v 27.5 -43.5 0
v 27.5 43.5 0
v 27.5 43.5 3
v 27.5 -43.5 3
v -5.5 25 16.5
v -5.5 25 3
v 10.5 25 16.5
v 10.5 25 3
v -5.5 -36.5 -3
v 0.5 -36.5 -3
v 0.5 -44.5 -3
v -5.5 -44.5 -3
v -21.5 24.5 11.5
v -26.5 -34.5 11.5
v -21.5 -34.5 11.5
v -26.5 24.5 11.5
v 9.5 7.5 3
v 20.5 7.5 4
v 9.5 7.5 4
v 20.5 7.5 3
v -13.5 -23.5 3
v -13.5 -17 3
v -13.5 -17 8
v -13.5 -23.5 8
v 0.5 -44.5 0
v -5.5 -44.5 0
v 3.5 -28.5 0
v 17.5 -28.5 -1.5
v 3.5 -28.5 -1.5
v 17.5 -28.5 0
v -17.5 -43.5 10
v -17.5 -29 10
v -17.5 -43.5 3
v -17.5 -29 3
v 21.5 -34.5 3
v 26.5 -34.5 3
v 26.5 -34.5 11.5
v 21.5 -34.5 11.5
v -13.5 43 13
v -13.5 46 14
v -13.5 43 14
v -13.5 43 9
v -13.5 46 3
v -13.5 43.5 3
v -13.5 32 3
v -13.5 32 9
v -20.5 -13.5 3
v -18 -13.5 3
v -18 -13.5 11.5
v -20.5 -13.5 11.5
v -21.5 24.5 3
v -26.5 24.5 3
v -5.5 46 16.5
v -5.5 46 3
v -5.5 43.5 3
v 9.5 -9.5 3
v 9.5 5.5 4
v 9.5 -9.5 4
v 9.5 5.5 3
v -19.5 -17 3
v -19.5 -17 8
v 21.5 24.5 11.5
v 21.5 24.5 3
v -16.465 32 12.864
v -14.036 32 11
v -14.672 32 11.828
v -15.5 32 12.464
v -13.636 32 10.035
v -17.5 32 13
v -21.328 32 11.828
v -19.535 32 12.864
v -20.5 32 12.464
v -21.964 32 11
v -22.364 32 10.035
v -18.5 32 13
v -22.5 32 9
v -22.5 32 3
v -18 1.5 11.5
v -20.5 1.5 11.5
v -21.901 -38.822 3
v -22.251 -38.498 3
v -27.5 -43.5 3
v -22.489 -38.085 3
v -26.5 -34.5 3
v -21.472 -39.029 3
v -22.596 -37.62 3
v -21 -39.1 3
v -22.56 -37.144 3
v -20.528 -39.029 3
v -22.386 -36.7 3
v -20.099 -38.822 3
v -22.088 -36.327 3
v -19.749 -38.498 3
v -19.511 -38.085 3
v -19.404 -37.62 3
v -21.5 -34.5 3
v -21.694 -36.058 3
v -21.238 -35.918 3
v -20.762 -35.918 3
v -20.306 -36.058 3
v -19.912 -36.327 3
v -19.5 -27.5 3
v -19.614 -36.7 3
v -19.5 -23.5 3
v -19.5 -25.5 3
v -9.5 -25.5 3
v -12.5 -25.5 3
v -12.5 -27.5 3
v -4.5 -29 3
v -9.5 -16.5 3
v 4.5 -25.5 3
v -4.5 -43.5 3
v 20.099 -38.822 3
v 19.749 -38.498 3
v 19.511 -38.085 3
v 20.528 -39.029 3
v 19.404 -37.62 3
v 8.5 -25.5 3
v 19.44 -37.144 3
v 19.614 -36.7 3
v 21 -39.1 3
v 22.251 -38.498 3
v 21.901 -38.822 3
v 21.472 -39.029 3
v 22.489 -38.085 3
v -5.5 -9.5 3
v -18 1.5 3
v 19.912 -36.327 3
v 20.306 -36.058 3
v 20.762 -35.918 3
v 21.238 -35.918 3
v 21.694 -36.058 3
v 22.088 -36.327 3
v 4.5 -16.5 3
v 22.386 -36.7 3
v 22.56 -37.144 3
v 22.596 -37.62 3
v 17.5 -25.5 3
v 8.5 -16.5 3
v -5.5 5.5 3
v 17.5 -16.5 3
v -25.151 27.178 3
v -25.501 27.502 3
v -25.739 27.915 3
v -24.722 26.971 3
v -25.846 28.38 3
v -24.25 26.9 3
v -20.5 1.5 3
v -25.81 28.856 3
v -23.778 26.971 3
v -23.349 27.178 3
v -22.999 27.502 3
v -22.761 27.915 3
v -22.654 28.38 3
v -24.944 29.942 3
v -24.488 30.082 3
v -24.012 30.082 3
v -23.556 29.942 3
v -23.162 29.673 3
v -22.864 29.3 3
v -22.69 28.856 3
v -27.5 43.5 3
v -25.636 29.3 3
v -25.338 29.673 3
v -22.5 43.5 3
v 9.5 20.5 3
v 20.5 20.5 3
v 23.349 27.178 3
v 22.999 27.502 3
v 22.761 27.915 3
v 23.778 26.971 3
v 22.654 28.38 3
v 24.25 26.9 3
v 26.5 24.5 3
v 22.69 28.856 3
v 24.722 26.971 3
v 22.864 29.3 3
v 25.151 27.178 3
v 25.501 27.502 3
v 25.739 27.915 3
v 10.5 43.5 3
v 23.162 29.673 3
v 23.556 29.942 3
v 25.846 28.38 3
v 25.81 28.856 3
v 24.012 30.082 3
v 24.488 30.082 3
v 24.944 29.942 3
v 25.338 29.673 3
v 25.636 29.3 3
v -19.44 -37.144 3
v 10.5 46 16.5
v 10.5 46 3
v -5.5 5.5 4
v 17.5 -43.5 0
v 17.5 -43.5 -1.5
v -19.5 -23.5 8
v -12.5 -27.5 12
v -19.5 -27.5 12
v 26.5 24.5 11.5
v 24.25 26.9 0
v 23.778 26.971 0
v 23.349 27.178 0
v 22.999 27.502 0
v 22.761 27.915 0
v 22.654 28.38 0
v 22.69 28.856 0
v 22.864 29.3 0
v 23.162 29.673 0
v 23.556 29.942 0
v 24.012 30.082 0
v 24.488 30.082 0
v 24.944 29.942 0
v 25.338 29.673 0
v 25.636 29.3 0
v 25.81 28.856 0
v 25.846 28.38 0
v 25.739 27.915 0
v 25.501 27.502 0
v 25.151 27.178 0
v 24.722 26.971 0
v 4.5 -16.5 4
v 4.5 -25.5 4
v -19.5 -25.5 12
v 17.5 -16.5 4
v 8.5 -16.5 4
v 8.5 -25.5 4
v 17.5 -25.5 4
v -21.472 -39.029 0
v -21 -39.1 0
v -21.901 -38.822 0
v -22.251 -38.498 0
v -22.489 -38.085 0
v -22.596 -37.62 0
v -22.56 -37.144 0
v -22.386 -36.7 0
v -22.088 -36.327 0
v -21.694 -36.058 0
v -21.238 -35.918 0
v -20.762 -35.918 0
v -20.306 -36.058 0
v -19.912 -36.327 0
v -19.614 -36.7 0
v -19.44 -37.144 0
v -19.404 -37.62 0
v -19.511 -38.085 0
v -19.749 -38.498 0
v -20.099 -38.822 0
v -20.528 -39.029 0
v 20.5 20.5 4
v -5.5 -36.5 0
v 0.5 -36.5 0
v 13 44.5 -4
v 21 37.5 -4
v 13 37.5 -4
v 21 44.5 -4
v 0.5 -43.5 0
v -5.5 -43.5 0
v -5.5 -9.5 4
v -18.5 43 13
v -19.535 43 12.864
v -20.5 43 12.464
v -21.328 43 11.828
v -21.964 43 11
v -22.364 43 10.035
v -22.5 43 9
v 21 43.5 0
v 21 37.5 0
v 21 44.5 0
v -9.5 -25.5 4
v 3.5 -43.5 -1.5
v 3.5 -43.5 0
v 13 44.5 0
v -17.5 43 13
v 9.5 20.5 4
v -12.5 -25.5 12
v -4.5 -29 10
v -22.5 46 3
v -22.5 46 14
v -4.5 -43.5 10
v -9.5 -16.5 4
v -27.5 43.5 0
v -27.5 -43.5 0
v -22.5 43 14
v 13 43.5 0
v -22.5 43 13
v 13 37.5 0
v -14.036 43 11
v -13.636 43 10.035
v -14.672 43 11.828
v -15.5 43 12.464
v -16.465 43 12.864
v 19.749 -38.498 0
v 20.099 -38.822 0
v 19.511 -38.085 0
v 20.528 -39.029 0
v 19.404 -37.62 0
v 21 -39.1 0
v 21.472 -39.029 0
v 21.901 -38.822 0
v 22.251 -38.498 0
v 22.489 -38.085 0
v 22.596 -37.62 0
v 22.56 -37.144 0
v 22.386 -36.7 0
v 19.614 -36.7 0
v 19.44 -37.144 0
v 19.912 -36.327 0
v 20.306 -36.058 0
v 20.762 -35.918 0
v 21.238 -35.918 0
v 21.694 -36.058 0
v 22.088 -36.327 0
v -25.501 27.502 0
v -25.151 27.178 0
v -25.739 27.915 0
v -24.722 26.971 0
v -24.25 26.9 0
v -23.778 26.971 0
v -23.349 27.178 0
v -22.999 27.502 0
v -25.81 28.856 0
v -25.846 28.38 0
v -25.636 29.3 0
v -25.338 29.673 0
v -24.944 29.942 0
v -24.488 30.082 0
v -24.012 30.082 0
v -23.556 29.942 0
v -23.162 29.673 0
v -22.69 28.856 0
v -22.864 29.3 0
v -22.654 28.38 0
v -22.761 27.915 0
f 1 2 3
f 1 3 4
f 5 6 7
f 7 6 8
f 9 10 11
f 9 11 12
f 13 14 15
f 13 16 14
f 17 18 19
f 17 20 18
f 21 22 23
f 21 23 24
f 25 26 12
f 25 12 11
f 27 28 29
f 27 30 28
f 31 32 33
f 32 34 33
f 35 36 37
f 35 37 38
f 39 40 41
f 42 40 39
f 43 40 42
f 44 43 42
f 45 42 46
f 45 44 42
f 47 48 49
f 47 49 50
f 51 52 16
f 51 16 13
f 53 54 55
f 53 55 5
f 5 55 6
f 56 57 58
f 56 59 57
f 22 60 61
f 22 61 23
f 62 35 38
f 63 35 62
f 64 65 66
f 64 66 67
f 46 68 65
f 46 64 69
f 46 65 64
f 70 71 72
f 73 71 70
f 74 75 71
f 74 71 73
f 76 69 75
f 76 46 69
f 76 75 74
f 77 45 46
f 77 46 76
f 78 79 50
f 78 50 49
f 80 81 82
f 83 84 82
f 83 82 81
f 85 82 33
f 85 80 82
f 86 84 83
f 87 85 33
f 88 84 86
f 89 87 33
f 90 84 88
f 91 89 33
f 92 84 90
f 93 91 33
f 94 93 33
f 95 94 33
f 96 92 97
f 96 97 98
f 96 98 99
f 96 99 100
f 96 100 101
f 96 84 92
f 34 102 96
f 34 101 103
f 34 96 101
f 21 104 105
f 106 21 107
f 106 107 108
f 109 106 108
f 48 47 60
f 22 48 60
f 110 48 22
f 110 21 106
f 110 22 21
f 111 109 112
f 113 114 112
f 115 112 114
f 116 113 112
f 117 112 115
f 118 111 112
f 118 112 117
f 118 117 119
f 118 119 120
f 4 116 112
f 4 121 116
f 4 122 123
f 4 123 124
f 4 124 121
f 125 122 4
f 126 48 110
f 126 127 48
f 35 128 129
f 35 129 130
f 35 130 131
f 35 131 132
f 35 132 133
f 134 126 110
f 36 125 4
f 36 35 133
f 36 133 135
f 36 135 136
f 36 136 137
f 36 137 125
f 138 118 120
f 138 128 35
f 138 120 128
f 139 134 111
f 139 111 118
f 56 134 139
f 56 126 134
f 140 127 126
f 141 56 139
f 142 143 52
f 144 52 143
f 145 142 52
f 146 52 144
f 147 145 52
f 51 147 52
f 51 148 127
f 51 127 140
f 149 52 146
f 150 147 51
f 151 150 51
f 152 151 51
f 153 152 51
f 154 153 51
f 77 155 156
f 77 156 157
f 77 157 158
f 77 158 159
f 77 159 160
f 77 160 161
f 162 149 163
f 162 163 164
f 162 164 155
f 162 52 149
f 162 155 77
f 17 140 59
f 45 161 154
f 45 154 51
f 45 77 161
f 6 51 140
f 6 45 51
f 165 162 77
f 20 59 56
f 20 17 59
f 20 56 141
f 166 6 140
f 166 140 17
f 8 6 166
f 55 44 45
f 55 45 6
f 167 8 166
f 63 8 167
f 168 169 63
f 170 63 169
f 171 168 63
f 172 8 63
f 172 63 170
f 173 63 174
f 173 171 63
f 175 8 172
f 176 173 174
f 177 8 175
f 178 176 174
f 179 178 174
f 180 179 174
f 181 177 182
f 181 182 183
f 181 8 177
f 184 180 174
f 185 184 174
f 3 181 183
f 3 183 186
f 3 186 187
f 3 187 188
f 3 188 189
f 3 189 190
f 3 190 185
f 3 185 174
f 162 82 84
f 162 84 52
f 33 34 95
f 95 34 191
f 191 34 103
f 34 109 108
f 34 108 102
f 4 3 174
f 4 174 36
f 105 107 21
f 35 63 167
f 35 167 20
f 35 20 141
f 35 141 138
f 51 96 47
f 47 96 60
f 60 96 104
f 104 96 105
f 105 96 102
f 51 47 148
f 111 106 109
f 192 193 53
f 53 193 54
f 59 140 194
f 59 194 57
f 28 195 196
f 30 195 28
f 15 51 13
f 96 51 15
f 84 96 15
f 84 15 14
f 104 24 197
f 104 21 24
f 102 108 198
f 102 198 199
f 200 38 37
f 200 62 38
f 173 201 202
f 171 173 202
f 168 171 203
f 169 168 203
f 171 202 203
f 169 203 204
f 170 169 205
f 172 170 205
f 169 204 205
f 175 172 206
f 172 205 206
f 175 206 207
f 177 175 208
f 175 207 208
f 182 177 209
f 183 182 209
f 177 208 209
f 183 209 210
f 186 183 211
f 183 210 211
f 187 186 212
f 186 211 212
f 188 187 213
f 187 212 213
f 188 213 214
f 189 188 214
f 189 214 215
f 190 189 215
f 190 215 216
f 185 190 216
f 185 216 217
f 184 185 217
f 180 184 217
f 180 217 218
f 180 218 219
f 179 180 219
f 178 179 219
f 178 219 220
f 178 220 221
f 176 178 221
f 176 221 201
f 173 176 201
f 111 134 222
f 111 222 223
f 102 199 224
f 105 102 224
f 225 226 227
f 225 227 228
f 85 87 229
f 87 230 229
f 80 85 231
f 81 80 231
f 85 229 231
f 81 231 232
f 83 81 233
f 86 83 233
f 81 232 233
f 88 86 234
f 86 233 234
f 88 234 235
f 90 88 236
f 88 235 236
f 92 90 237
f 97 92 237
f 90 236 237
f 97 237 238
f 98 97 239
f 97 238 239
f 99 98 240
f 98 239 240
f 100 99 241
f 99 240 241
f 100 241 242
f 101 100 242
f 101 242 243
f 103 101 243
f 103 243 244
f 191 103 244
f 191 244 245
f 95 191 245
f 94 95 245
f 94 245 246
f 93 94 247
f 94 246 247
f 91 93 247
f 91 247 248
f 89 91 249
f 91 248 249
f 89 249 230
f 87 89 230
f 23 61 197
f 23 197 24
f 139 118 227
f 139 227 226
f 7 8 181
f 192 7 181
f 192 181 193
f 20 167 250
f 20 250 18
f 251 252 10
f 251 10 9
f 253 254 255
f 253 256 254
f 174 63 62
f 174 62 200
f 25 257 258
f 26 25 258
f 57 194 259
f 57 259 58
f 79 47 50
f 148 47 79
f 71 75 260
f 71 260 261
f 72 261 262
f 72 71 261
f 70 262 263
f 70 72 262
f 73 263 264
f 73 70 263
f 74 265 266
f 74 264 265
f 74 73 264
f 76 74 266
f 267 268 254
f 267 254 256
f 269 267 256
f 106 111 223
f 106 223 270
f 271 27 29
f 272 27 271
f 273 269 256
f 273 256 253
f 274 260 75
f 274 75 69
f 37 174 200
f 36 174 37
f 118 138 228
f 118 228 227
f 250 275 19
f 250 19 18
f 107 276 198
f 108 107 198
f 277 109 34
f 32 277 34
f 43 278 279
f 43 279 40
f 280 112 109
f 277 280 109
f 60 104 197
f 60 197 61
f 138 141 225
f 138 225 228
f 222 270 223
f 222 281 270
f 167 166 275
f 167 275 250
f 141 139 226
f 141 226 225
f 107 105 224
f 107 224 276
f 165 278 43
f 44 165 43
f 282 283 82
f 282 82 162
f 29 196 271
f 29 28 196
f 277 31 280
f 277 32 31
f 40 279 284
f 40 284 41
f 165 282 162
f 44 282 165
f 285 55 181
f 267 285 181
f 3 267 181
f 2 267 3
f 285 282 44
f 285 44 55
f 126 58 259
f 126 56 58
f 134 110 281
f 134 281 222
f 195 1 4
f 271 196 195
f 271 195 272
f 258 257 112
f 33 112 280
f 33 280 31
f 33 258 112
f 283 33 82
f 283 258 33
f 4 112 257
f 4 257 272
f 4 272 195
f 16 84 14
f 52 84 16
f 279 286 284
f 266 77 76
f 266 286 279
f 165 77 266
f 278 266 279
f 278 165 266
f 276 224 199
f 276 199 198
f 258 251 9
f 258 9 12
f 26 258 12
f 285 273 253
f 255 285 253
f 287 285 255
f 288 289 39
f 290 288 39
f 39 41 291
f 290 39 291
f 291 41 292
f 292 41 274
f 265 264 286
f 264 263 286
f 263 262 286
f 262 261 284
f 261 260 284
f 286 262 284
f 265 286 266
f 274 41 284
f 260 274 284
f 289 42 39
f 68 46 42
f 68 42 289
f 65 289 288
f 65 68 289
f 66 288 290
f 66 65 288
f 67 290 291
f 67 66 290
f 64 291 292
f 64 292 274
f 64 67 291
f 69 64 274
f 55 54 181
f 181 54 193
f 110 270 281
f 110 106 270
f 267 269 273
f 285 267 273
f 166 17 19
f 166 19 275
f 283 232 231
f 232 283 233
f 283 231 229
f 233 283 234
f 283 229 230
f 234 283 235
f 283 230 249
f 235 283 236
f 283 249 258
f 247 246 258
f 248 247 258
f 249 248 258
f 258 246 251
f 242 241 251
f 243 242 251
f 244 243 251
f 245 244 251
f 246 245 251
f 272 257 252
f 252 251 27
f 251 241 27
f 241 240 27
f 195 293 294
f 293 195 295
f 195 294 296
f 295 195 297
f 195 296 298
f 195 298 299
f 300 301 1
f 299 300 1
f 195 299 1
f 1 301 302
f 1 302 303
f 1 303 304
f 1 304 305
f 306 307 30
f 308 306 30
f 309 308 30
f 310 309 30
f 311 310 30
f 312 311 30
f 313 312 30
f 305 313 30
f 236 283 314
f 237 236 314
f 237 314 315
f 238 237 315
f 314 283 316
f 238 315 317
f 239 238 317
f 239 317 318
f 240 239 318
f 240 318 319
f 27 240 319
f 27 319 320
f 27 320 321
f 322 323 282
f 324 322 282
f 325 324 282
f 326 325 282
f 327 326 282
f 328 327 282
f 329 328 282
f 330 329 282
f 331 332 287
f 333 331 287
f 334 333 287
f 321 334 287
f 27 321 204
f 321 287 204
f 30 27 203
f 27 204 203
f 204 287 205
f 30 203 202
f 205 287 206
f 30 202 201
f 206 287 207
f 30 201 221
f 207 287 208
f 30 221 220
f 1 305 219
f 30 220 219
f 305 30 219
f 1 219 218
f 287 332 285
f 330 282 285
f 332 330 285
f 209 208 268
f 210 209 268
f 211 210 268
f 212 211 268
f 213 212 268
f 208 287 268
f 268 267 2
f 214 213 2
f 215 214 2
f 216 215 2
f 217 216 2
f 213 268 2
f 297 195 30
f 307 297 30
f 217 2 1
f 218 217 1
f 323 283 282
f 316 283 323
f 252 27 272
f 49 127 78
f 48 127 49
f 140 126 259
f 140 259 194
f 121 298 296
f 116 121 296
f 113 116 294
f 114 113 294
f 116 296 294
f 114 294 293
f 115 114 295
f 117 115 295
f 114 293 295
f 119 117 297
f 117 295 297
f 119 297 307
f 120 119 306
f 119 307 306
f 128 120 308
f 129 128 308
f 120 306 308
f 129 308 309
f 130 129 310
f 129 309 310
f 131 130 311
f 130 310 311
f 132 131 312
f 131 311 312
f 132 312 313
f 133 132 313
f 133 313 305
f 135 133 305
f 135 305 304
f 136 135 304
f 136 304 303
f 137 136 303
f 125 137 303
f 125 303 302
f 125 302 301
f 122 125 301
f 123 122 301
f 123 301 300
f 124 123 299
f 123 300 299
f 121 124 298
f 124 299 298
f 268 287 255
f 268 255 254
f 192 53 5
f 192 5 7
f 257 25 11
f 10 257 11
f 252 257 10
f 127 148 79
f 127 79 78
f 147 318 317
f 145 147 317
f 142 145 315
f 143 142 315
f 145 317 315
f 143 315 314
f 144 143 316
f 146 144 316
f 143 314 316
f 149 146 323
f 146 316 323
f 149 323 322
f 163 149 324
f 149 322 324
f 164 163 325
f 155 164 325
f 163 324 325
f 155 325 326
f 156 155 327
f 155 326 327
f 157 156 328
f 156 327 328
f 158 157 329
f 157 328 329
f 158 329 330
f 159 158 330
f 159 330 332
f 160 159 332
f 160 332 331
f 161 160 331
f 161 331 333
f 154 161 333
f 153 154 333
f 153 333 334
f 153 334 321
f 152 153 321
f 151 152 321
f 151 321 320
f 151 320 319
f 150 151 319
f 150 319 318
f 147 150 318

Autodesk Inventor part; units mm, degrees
ref_plane "YZ Plane" through (0, 0, 0) normal (1, 0, 0) x (0, 1, 0)
ref_plane "XZ Plane" through (0, 0, 0) normal (0, 1, 0) x (-1, 0, 0)
ref_plane "XY Plane" through (0, 0, 0) normal (0, 0, 1) x (1, 0, 0)
sketch "スケッチ1" plane through (0, 0, 0) normal (0, 0, 1) x (1, 0, 0)
  line L0 (-27.5, 43.5) -> (27.5, 43.5)
  line L1 (27.5, 43.5) -> (27.5, -43.5)
  line L2 (27.5, -43.5) -> (-27.5, -43.5)
  line L3 (-27.5, -43.5) -> (-27.5, 43.5)
  point P0 (0, 0)
  dimension "d0" = 87
  dimension "d1" = 55
  dimension "d2" = 27.5
  dimension "d3" = 43.5
extrude "押し出し1" add sketch "スケッチ1" along normal blind 3
sketch "スケッチ2" plane through (0, 0, 3) normal (0, 0, 1) x (1, 0, 0)
  circle A0 centre (-24.25, 28.5) radius 1.6
  circle A1 centre (24.25, 28.5) radius 1.6
  circle A2 centre (-21, -37.5) radius 1.6
  circle A3 centre (21, -37.5) radius 1.6
  line L0 (-27.5, 43.5) -> (27.5, 43.5) projected
  point P0 (0, 0)
  dimension "d6" = 3.2
  dimension "d7" = 48.5
  dimension "d8" = 42
  dimension "d9" = 21
  dimension "d10" = 24.25
  dimension "d11" = 66
  dimension "d12" = 66
  dimension "d22" = 15
  dimension "d23" = 15
hole "穴1" at (-21, -37.5, 3) at (21, -37.5, 3) at (24.25, 28.5, 3) at (-24.25, 28.5, 3) direction (0, 0, -1) diameter 3.2 end through all
sketch "スケッチ3" plane through (0, 0, 3) normal (0, 0, 1) x (1, 0, 0)
  line L0 (27.5, -43.5) -> (-27.5, -43.5) projected
  line L1 (-26.5, 24.5) -> (-21.5, 24.5)
  line L2 (-21.5, 24.5) -> (-21.5, -34.5)
  line L3 (-21.5, -34.5) -> (-26.5, -34.5)
  line L4 (-26.5, -34.5) -> (-26.5, 24.5)
  line L5 (21.5, 24.5) -> (26.5, 24.5)
  line L6 (26.5, 24.5) -> (26.5, -34.5)
  line L7 (26.5, -34.5) -> (21.5, -34.5)
  line L8 (21.5, -34.5) -> (21.5, 24.5)
  point P0 (0, 0)
  dimension "d24" = 5
  dimension "d25" = 59
  dimension "d26" = 9
  dimension "d27" = 9
  dimension "d28" = 43
  dimension "d29" = 21.5
extrude "押し出し2" add sketch "スケッチ3" along normal blind 8.5
sketch "スケッチ4" plane through (0, 0, 3) normal (0, 0, 1) x (1, 0, 0)
  line L0 (-5.5, 25) -> (10.5, 25)
  line L1 (10.5, 25) -> (10.5, 46)
  line L2 (10.5, 46) -> (-5.5, 46)
  line L3 (-5.5, 46) -> (-5.5, 25)
  line L4 (27.5, 43.5) -> (27.5, -43.5) projected
  point P0 (0, 0)
  dimension "d57" = 16
  dimension "d58" = 21
  dimension "d59" = 2.5
  dimension "d60" = 17
extrude "押し出し3" add sketch "スケッチ4" along normal blind 13.5
sketch "スケッチ5" plane through (0, 0, 3) normal (0, 0, 1) x (1, 0, 0)
  line L0 (-22.5, 46) -> (-13.5, 46)
  line L1 (-13.5, 46) -> (-13.5, 32)
  line L2 (-13.5, 32) -> (-22.5, 32)
  line L3 (-22.5, 32) -> (-22.5, 46)
  line L4 (-27.5, -43.5) -> (-27.5, 43.5) projected
  point P0 (5.6589, 43.5)
  dimension "d61" = 5
  dimension "d62" = 9
  dimension "d63" = 14
  dimension "d64" = 2.5
extrude "押し出し4" add sketch "スケッチ5" along normal blind 11
sketch "スケッチ6" plane through (0, 0, 3) normal (0, 0, 1) x (1, 0, 0)
  line L0 (27.5, -43.5) -> (-27.5, -43.5) projected
  line L1 (-17.5, -43.5) -> (-4.5, -43.5)
  line L2 (-4.5, -43.5) -> (-4.5, -29)
  line L3 (-4.5, -29) -> (-17.5, -29)
  line L4 (-17.5, -29) -> (-17.5, -43.5)
  line L5 (-27.5, -43.5) -> (-27.5, 43.5) projected
  point P0 (0, 0)
  dimension "d65" = 13
  dimension "d66" = 10
  dimension "d67" = 14.5
extrude "押し出し5" add sketch "スケッチ6" along normal blind 7
sketch "スケッチ7" plane through (0, 0, 0) normal (0, 0, -1) x (-1, 0, 0)
  line L0 (5.5, -44.5) -> (-0.5, -44.5)
  line L1 (-0.5, -44.5) -> (-0.5, -36.5)
  line L2 (-0.5, -36.5) -> (5.5, -36.5)
  line L3 (5.5, -36.5) -> (5.5, -44.5)
  line L4 (27.5, -43.5) -> (27.5, 43.5) projected
  point P0 (0, 0)
  dimension "d68" = 6
  dimension "d69" = 8
  dimension "d70" = 22
  dimension "d71" = 1
extrude "押し出し6" add sketch "スケッチ7" along normal blind 3
sketch "スケッチ8" plane through (0, 0, 0) normal (0, 0, -1) x (-1, 0, 0)
  line L0 (-27.5, -43.5) -> (-0.5, -43.5) projected
  line L1 (-3.5, -43.5) -> (-17.5, -43.5)
  line L2 (-17.5, -43.5) -> (-17.5, -28.5)
  line L3 (-17.5, -28.5) -> (-3.5, -28.5)
  line L4 (-3.5, -28.5) -> (-3.5, -43.5)
  line L5 (-27.5, 43.5) -> (-27.5, -43.5) projected
  point P0 (0, 0)
  dimension "d72" = 14
  dimension "d73" = 15
  dimension "d74" = 10
extrude "押し出し7" add sketch "スケッチ8" along normal blind 1.5
sketch "スケッチ9" plane through (0, 0, 0) normal (0, 0, -1) x (-1, 0, 0)
  line L0 (-21, 44.5) -> (-13, 44.5)
  line L1 (-13, 44.5) -> (-13, 37.5)
  line L2 (-13, 37.5) -> (-21, 37.5)
  line L3 (-21, 37.5) -> (-21, 44.5)
  line L4 (-27.5, 43.5) -> (-27.5, -43.5) projected
  point P0 (0, 0)
  dimension "d75" = 8
  dimension "d76" = 7
  dimension "d77" = 6.5
  dimension "d78" = 1
extrude "押し出し8" add sketch "スケッチ9" along normal blind 4
sketch "スケッチ11" plane through (0, 0, 3) normal (0, 0, 1) x (1, 0, 0)
  line L0 (-20.5, 1.5) -> (-18, 1.5)
  line L1 (-18, 1.5) -> (-18, -13.5)
  line L2 (-18, -13.5) -> (-20.5, -13.5)
  line L3 (-20.5, -13.5) -> (-20.5, 1.5)
  line L4 (-17.5, -43.5) -> (-27.5, -43.5) projected
  line L5 (-21.5, 24.5) -> (-21.5, -34.5) projected
  point P0 (0, 0)
  dimension "d79" = 15
  dimension "d80" = 2.5
  dimension "d81" = 30
  dimension "d82" = 1
extrude "押し出し10" add sketch "スケッチ11" along normal blind 8.5
sketch "スケッチ12" plane through (0, 0, 3) normal (0, 0, 1) x (1, 0, 0)
  line L0 (-19.5, -17) -> (-13.5, -17)
  line L1 (-13.5, -17) -> (-13.5, -23.5)
  line L2 (-13.5, -23.5) -> (-19.5, -23.5)
  line L3 (-19.5, -23.5) -> (-19.5, -17)
  line L4 (-17.5, -43.5) -> (-27.5, -43.5) projected
  line L5 (-21.5, 24.5) -> (-21.5, -34.5) projected
  point P0 (0, 0)
  dimension "d83" = 6
  dimension "d84" = 6.5
  dimension "d86" = 2
  dimension "d87" = 20
extrude "押し出し11" add sketch "スケッチ12" along normal blind 5
sketch "スケッチ13" plane through (0, 0, 14) normal (0, 0, 1) x (1, 0, 0)
  line L0 (-13.5, 46) -> (-13.5, 32) projected
  line L1 (-22.5, 32) -> (-13.5, 32)
  line L2 (-13.5, 32) -> (-13.5, 43)
  line L3 (-13.5, 43) -> (-22.5, 43)
  line L4 (-22.5, 43) -> (-22.5, 32)
  point P0 (0, 0)
  dimension "d112" = 11
extrude "押し出し13" cut sketch "スケッチ13" against normal blind 1
sketch "スケッチ14" plane through (0, 0, 3) normal (0, 0, 1) x (1, 0, 0)
  line L0 (-17.5, -43.5) -> (-27.5, -43.5) projected
  line L1 (-21.5, 24.5) -> (-21.5, -34.5) projected
  line L2 (-19.5, -25.5) -> (-12.5, -25.5)
  line L3 (-12.5, -25.5) -> (-12.5, -27.5)
  line L4 (-12.5, -27.5) -> (-19.5, -27.5)
  line L5 (-19.5, -27.5) -> (-19.5, -25.5)
  point P0 (0, 0)
  dimension "d88" = 7
  dimension "d89" = 2
  dimension "d90" = 2
  dimension "d91" = 16
extrude "押し出し14" add sketch "スケッチ14" along normal blind 9
sketch "スケッチ10" plane through (0, 0, 3) normal (0, 0, 1) x (1, 0, 0)
  line L0 (-5.5, 5.5) -> (9.5, 5.5)
  line L1 (9.5, 5.5) -> (9.5, -9.5)
  line L2 (9.5, -9.5) -> (-5.5, -9.5)
  line L3 (-5.5, -9.5) -> (-5.5, 5.5)
  line L4 (-9.5, -16.5) -> (4.5, -16.5)
  line L5 (4.5, -16.5) -> (4.5, -25.5)
  line L6 (4.5, -25.5) -> (-9.5, -25.5)
  line L7 (-9.5, -25.5) -> (-9.5, -16.5)
  line L8 (9.5, 20.5) -> (20.5, 20.5)
  line L9 (20.5, 20.5) -> (20.5, 7.5)
  line L10 (20.5, 7.5) -> (9.5, 7.5)
  line L11 (9.5, 7.5) -> (9.5, 20.5)
  line L12 (27.5, -43.5) -> (-4.5, -43.5) projected
  line L13 (27.5, 43.5) -> (27.5, -43.5) projected
  line L14 (10.5, 43.5) -> (27.5, 43.5) projected
  line L15 (8.5, -16.5) -> (17.5, -16.5)
  line L16 (17.5, -16.5) -> (17.5, -25.5)
  line L17 (17.5, -25.5) -> (8.5, -25.5)
  line L18 (8.5, -25.5) -> (8.5, -16.5)
  point P0 (0, 0)
  dimension "d94" = 11
  dimension "d95" = 15
  dimension "d96" = 14
  dimension "d97" = 9
  dimension "d98" = 9
  dimension "d99" = 9
  dimension "d100" = 15
  dimension "d101" = 13
  dimension "d102" = 23
  dimension "d103" = 38
  dimension "d104" = 18
  dimension "d105" = 18
  dimension "d106" = 7
  dimension "d107" = 18
  dimension "d108" = 10
  dimension "d109" = 4
extrude "押し出し15" add sketch "スケッチ10" along normal blind 1
fillet "フィレット1" radius 4 2 edges at (-13.5, 37.5, 13) (-22.5, 37.5, 13)
properties part number "43" material "PC/ABS プラスチック"
